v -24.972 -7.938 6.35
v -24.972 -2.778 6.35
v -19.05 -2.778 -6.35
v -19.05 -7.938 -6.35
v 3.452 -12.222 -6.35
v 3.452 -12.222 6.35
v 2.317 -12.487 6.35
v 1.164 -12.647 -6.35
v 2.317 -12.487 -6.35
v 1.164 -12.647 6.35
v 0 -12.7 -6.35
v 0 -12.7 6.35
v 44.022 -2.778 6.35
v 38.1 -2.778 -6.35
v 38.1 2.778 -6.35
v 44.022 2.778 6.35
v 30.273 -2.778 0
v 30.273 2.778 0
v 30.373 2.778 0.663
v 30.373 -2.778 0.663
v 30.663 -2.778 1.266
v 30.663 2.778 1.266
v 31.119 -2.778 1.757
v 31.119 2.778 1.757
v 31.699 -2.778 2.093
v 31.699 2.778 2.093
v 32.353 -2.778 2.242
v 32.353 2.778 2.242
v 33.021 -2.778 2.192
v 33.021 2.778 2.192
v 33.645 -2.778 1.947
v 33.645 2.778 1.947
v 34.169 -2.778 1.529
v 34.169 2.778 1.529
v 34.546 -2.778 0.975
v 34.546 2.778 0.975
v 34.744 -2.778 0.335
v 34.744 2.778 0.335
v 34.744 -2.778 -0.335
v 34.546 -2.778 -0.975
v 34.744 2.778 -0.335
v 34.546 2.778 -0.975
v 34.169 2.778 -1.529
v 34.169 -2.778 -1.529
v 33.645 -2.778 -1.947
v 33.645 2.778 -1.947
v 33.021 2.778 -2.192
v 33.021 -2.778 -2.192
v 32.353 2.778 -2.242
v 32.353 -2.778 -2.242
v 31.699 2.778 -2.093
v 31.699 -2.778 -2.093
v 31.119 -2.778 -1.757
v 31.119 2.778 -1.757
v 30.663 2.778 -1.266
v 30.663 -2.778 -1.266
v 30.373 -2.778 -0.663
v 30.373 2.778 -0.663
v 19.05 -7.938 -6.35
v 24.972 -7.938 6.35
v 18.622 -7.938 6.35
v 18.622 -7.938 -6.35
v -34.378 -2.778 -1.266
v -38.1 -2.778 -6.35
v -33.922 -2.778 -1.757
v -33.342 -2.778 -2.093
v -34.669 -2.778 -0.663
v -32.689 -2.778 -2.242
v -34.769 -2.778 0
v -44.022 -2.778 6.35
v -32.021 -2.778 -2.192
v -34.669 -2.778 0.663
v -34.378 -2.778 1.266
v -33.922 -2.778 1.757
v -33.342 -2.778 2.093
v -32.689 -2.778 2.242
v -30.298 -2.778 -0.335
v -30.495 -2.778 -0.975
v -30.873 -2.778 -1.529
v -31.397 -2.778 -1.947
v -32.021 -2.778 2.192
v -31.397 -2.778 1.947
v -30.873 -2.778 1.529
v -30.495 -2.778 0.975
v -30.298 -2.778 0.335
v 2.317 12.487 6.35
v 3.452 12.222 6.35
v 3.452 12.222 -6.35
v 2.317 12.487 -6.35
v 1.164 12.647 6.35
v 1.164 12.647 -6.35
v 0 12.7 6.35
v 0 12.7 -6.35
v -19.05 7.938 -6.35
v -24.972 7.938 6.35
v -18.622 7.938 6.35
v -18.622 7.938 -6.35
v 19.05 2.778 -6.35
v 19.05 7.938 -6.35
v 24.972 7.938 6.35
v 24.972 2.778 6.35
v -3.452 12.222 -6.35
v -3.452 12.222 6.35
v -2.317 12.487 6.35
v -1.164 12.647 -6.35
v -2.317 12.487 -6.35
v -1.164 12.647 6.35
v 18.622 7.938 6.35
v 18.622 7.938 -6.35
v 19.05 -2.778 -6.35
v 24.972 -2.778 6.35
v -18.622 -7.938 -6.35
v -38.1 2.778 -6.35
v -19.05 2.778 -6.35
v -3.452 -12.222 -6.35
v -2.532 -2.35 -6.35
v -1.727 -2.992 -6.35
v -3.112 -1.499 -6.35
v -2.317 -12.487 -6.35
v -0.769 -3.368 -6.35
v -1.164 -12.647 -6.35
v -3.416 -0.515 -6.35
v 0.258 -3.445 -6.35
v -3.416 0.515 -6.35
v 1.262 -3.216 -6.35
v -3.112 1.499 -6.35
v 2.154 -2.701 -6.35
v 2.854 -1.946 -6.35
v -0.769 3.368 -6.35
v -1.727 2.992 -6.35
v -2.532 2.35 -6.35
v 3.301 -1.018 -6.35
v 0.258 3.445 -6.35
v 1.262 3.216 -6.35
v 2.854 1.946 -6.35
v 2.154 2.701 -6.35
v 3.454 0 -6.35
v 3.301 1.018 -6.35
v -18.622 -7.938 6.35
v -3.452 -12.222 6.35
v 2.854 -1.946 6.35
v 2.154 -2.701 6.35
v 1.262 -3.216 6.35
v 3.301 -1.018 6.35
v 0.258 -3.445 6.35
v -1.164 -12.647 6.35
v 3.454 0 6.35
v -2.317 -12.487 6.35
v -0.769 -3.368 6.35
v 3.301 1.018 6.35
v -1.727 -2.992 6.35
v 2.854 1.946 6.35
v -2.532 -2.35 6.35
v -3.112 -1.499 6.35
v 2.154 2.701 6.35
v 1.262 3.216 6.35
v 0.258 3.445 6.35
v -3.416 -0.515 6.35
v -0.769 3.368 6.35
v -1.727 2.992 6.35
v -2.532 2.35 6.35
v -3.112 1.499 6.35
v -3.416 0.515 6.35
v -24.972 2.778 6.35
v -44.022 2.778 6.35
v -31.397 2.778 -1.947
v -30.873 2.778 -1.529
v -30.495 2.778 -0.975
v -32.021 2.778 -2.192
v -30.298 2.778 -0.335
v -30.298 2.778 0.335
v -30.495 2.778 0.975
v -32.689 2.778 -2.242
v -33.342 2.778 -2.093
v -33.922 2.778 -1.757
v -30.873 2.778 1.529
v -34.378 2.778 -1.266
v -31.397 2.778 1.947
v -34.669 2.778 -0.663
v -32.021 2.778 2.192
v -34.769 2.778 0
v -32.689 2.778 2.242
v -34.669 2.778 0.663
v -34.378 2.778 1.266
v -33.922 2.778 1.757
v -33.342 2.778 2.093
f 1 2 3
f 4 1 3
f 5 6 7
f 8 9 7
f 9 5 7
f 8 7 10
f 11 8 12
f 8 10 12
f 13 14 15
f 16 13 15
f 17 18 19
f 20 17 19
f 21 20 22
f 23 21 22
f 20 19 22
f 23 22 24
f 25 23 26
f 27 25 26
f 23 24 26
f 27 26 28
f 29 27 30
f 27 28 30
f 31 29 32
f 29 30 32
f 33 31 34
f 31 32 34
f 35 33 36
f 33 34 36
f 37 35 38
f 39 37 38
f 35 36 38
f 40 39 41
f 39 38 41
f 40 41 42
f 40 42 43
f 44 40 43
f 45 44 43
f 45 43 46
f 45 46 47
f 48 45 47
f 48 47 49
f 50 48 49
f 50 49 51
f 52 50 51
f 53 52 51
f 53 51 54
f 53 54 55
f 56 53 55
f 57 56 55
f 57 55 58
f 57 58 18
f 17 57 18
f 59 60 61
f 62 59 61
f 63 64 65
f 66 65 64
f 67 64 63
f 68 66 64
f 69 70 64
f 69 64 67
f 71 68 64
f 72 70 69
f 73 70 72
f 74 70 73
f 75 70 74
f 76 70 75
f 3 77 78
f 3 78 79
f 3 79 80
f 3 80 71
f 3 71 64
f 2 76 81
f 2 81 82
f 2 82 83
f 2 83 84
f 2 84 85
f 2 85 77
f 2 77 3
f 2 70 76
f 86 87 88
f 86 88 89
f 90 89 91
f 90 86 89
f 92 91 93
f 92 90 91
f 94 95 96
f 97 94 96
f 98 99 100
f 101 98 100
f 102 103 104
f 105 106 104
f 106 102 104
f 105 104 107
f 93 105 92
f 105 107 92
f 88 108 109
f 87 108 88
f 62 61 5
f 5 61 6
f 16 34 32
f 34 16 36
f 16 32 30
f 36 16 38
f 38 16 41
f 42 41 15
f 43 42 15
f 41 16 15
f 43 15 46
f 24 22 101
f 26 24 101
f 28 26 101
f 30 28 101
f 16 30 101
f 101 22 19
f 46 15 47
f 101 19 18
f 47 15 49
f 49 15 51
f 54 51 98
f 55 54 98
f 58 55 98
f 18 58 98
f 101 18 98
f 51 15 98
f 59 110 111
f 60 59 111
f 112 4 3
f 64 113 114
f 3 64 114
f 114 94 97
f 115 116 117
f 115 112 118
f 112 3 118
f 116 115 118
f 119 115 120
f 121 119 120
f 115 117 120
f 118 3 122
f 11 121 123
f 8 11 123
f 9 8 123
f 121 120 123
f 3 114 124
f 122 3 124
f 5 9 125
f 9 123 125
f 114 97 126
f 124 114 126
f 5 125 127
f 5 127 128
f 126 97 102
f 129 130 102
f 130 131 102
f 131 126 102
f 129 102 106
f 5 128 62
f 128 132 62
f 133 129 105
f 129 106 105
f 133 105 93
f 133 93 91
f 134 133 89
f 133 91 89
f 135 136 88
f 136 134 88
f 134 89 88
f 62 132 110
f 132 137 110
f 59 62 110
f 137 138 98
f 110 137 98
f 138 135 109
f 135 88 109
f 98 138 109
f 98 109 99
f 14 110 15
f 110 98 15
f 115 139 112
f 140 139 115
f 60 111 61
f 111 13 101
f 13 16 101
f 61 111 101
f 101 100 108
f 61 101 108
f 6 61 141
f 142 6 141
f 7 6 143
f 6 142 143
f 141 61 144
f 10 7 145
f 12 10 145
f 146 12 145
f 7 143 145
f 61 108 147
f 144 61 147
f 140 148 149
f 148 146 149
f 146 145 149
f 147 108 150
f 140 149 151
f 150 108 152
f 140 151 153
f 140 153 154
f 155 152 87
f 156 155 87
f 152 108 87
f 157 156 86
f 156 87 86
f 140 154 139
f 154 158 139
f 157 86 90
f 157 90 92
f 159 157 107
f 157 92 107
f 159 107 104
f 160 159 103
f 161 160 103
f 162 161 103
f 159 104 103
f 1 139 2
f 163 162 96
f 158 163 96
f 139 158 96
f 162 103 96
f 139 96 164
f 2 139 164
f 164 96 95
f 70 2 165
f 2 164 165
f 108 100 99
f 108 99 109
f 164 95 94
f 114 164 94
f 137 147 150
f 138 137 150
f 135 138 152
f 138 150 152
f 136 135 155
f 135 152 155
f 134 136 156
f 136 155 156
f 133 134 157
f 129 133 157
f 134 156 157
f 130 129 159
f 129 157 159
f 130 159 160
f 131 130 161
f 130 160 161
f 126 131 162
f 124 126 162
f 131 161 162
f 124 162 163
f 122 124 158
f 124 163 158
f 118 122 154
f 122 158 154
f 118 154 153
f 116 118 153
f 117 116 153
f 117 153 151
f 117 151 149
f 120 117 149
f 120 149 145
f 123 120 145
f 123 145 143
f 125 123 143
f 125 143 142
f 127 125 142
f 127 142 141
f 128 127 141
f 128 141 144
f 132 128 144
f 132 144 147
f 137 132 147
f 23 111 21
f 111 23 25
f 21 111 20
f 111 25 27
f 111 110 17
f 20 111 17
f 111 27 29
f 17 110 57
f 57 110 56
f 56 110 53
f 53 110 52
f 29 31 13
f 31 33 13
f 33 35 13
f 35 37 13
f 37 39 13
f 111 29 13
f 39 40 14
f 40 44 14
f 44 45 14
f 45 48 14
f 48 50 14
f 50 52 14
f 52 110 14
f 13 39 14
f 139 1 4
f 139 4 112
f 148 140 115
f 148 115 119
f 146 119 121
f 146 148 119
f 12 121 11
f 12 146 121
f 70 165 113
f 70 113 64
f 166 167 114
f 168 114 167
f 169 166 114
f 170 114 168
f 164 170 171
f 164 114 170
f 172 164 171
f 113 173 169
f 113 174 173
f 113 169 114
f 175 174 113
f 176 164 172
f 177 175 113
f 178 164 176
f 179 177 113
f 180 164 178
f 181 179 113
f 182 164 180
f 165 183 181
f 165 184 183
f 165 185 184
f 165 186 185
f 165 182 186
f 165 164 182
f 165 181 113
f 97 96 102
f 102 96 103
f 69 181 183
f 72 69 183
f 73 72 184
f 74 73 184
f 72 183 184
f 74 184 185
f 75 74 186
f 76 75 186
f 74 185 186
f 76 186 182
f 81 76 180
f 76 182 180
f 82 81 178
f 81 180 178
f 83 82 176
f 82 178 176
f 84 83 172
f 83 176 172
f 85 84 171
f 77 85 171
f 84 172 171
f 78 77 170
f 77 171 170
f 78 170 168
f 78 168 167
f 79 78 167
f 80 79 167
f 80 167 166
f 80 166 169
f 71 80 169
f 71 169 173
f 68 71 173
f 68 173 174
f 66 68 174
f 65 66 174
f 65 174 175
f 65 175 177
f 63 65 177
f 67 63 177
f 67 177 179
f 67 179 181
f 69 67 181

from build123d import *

# Parameters (mm, degrees)
BOSS_EXTRUDE1_DEPTH                      = 12.7
SKETCH5_R                                = 3.4544
CUT_EXTRUDE2_DEPTH                       = 31.760138832
SKETCH6_W                                = 19.05
SKETCH6_H                                = 5.55625
SKETCH7_W                                = 19.05
SKETCH7_H                                = 5.55625
CUT_EXTRUDE3_REACH                       = 49.094
SKETCH8_R                                = 2.2479
CUT_EXTRUDE4_DEPTH                       = 48.544988458
MIRROR1_AT_THE_SECOND_PLANE_COPY_1_DEPTH = 48.544988458


with BuildPart() as part:
    # Sketch2 → Boss-Extrude1 (new, symmetric)
    with BuildSketch(Plane(origin=(0, 0, 0), x_dir=(1, 0, 0), z_dir=(0, 1, 0))):
        Polygon((-19.05, 6.35), (19.05, 6.35), (24.972107259, -6.35), (-24.972107259, -6.35), align=None)
    extrude(amount=BOSS_EXTRUDE1_DEPTH, both=True)

    # Sketch5 → Cut-Extrude2 (cut, through all)
    with BuildSketch(Plane.XY.offset(6.35)):
        Circle(SKETCH5_R)
    extrude(amount=-CUT_EXTRUDE2_DEPTH, mode=Mode.SUBTRACT)

    # Sweep1: sweep along a curve in space
    with BuildLine() as sweep1_path:
        Line((-19.05, 12.7, -6.35), (-24.972107259, 12.7, 6.35))
    # Sketch6 → Sweep1 (sweep)
    with BuildSketch(Plane.XY.offset(6.35)):
        with Locations((-34.497107259, 0)):
            Rectangle(SKETCH6_W, SKETCH6_H)
    sweep(path=sweep1_path.line)

    # Sweep2: sweep along a curve in space
    with BuildLine() as sweep2_path:
        Line((24.972107259, 12.7, 6.35), (19.05, 12.7, -6.35))
    # Sketch7 → Sweep2 (sweep)
    with BuildSketch(Plane.XY.offset(6.35)):
        with Locations((34.497107259, 0)):
            Rectangle(SKETCH7_W, SKETCH7_H)
    sweep(path=sweep2_path.line)

    # Sketch8 → Cut-Extrude3 (cut, up to next)
    with BuildSketch(Plane(origin=(0, 2.778125, 0), x_dir=(1, 0, 0), z_dir=(0, 1, 0)), mode=Mode.PRIVATE) as cut_extrude3_sk1:
        with Locations(Location((-32.520728307, 0, 0), (0, 0, 180))):
            Circle(SKETCH8_R)
    cut_extrude3_tool1 = extrude(cut_extrude3_sk1.sketch, amount=-CUT_EXTRUDE3_REACH, mode=Mode.PRIVATE) & part.part
    # Sketch8 → Cut-Extrude3 (cut, up to next)
    with BuildSketch(Plane(origin=(0, 2.778125, 0), x_dir=(1, 0, 0), z_dir=(0, 1, 0)), mode=Mode.PRIVATE) as cut_extrude3_sk2:
        with Locations(Location((32.520728307, 0, 0), (0, 0, 180))):
            Circle(SKETCH8_R)
    cut_extrude3_tool2 = extrude(cut_extrude3_sk2.sketch, amount=-CUT_EXTRUDE3_REACH, mode=Mode.PRIVATE) & part.part
    add(cut_extrude3_tool1.solids().sort_by_distance((-32.520728, 2.778125, 0))[0], mode=Mode.SUBTRACT)
    add(cut_extrude3_tool2.solids().sort_by_distance((32.520728, 2.778125, 0))[0], mode=Mode.SUBTRACT)

    # Sketch9 → Cut-Extrude4 (cut, through all)
    with BuildSketch(Plane.XY.offset(6.35)):
        with BuildLine():
            Line((-24.972107259, 12.7), (-24.972107259, 7.9375))
            Line((-24.972107259, 7.9375), (-18.622107259, 7.9375))
            Line((-18.622107259, 7.9375), (-3.451726858, 12.221930359))
            ThreePointArc((-3.451726858, 12.221930359), (-1.742338148, 12.579914856), (0, 12.7))
            Line((0, 12.7), (-24.972107259, 12.7))
        make_face()
    cut_extrude4 = extrude(amount=-CUT_EXTRUDE4_DEPTH, mode=Mode.SUBTRACT)

    # Mirror1: Cut-Extrude4 across plane
    add(cut_extrude4.mirror(Plane(origin=(0, 0, 0), x_dir=(0, 0, 1), z_dir=(1, 0, 0))), mode=Mode.SUBTRACT)

    # Mirror1 at the second plane: Cut-Extrude4 across plane
    add(cut_extrude4.mirror(Plane.ZX), mode=Mode.SUBTRACT)

    # Mirror1 at the second plane copy 1 sketc → Mirror1 at the second plane copy 1 (cut, through all)
    with BuildSketch(Plane(origin=(0, 0, 6.35), x_dir=(-1, 0, 0), z_dir=(0, 0, 1))):
        with BuildLine():
            Line((-24.972107259, 12.7), (-24.972107259, 7.9375))
            Line((-24.972107259, 7.9375), (-18.622107259, 7.9375))
            Line((-18.622107259, 7.9375), (-3.451726858, 12.221930359))
            ThreePointArc((-3.451726858, 12.221930359), (-1.742338148, 12.579914856), (0, 12.7))
            Line((0, 12.7), (-24.972107259, 12.7))
        make_face()
    extrude(amount=-MIRROR1_AT_THE_SECOND_PLANE_COPY_1_DEPTH, mode=Mode.SUBTRACT)


solid = part.part
